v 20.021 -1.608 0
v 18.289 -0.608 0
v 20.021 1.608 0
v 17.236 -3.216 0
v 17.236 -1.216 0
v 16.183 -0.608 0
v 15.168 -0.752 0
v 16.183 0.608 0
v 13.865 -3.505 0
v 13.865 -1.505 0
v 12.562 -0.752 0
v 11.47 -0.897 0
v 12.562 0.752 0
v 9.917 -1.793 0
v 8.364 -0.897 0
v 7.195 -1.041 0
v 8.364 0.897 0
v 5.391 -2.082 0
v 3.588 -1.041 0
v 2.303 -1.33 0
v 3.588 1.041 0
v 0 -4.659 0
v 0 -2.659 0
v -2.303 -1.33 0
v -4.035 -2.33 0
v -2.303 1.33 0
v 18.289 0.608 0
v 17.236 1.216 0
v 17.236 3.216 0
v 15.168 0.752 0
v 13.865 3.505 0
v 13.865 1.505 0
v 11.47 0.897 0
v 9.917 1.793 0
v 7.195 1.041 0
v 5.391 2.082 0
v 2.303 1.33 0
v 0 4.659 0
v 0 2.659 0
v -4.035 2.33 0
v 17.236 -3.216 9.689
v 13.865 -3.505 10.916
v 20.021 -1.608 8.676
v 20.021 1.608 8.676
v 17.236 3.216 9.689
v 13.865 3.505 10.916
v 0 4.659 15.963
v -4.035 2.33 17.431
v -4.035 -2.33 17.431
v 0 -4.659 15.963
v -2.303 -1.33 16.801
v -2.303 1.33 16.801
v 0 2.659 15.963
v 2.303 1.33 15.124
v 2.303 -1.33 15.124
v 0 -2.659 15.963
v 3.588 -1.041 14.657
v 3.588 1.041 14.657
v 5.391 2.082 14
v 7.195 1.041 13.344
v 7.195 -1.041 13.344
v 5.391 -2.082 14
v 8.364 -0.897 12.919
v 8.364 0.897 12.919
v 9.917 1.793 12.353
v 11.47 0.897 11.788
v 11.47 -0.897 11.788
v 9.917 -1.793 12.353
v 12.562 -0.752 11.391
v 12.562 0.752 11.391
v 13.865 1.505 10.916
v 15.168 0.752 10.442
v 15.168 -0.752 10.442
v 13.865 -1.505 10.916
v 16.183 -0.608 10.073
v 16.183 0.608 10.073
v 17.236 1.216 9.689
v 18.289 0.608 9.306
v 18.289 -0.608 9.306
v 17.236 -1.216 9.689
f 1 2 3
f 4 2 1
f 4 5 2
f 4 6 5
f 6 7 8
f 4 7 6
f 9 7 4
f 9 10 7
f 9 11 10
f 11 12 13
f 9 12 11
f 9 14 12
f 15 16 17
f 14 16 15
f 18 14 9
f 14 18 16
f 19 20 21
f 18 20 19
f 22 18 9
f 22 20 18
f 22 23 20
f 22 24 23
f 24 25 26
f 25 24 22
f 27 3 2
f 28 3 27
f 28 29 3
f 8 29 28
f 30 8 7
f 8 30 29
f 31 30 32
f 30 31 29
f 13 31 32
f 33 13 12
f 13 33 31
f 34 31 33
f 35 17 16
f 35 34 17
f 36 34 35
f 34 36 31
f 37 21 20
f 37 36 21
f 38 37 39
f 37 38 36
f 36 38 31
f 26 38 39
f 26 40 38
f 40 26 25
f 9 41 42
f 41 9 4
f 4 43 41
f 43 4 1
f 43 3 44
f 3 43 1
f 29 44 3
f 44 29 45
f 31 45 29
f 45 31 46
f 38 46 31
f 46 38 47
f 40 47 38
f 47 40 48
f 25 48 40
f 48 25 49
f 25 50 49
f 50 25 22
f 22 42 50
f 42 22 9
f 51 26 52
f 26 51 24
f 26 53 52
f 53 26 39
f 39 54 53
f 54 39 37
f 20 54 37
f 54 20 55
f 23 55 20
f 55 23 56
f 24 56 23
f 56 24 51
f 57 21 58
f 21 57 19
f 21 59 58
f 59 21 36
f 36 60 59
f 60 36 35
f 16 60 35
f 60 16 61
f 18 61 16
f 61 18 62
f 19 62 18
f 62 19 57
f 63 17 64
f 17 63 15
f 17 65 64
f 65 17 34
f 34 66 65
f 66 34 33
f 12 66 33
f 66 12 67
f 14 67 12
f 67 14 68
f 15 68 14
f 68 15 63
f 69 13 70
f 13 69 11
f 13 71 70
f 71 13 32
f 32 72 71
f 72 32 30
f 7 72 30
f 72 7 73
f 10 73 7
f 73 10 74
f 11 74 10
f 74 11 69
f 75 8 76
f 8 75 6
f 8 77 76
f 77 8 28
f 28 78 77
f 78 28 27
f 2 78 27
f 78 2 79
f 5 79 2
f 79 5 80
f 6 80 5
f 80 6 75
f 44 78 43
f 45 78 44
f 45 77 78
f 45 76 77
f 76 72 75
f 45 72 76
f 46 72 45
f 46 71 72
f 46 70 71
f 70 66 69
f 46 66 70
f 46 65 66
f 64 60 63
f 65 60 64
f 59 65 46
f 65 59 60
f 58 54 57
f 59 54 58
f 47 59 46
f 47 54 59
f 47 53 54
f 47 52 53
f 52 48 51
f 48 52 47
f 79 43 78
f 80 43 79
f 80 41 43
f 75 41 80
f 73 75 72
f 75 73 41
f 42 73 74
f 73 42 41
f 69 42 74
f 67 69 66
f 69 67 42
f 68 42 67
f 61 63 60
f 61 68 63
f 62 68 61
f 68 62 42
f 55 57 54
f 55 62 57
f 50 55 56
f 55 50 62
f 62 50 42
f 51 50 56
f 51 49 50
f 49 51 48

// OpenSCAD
sizes = [ 4, 3, 2.5, 2, 1.5 ];
spacing = 1;
thickness = 2;
rotate = 30;
tolerance = 0.7;
height = 30;
cut_height = 15;
cut_angle = 20;

difference() {
  union() {
    linear_extrude(height)
    difference() {
      hull() // comment out here for hexagon shape body
      hexes(sizes, spacing, thickness);
      hexes(sizes, spacing);
    }
  }

  rotate([0, cut_angle, 0])
  translate([0, 0, 500+cut_height])
  cube([1000, 1000, 1000], center=true);
}

module hexes(array, spacing=0, offset=0, index=0) {
  d = array[index] * 2 / tan(60) + tolerance;
  rotate([0, 0, rotate]) circle(r=d/2 + offset, $fn=6);
  
  if (index < len(array) - 1) {
    d_2 = array[index+1] * 2 / tan(60);
    translate([(d + d_2)/2 + spacing, 0, 0])
    hexes(array, spacing, offset, index + 1);
  }
  
}
